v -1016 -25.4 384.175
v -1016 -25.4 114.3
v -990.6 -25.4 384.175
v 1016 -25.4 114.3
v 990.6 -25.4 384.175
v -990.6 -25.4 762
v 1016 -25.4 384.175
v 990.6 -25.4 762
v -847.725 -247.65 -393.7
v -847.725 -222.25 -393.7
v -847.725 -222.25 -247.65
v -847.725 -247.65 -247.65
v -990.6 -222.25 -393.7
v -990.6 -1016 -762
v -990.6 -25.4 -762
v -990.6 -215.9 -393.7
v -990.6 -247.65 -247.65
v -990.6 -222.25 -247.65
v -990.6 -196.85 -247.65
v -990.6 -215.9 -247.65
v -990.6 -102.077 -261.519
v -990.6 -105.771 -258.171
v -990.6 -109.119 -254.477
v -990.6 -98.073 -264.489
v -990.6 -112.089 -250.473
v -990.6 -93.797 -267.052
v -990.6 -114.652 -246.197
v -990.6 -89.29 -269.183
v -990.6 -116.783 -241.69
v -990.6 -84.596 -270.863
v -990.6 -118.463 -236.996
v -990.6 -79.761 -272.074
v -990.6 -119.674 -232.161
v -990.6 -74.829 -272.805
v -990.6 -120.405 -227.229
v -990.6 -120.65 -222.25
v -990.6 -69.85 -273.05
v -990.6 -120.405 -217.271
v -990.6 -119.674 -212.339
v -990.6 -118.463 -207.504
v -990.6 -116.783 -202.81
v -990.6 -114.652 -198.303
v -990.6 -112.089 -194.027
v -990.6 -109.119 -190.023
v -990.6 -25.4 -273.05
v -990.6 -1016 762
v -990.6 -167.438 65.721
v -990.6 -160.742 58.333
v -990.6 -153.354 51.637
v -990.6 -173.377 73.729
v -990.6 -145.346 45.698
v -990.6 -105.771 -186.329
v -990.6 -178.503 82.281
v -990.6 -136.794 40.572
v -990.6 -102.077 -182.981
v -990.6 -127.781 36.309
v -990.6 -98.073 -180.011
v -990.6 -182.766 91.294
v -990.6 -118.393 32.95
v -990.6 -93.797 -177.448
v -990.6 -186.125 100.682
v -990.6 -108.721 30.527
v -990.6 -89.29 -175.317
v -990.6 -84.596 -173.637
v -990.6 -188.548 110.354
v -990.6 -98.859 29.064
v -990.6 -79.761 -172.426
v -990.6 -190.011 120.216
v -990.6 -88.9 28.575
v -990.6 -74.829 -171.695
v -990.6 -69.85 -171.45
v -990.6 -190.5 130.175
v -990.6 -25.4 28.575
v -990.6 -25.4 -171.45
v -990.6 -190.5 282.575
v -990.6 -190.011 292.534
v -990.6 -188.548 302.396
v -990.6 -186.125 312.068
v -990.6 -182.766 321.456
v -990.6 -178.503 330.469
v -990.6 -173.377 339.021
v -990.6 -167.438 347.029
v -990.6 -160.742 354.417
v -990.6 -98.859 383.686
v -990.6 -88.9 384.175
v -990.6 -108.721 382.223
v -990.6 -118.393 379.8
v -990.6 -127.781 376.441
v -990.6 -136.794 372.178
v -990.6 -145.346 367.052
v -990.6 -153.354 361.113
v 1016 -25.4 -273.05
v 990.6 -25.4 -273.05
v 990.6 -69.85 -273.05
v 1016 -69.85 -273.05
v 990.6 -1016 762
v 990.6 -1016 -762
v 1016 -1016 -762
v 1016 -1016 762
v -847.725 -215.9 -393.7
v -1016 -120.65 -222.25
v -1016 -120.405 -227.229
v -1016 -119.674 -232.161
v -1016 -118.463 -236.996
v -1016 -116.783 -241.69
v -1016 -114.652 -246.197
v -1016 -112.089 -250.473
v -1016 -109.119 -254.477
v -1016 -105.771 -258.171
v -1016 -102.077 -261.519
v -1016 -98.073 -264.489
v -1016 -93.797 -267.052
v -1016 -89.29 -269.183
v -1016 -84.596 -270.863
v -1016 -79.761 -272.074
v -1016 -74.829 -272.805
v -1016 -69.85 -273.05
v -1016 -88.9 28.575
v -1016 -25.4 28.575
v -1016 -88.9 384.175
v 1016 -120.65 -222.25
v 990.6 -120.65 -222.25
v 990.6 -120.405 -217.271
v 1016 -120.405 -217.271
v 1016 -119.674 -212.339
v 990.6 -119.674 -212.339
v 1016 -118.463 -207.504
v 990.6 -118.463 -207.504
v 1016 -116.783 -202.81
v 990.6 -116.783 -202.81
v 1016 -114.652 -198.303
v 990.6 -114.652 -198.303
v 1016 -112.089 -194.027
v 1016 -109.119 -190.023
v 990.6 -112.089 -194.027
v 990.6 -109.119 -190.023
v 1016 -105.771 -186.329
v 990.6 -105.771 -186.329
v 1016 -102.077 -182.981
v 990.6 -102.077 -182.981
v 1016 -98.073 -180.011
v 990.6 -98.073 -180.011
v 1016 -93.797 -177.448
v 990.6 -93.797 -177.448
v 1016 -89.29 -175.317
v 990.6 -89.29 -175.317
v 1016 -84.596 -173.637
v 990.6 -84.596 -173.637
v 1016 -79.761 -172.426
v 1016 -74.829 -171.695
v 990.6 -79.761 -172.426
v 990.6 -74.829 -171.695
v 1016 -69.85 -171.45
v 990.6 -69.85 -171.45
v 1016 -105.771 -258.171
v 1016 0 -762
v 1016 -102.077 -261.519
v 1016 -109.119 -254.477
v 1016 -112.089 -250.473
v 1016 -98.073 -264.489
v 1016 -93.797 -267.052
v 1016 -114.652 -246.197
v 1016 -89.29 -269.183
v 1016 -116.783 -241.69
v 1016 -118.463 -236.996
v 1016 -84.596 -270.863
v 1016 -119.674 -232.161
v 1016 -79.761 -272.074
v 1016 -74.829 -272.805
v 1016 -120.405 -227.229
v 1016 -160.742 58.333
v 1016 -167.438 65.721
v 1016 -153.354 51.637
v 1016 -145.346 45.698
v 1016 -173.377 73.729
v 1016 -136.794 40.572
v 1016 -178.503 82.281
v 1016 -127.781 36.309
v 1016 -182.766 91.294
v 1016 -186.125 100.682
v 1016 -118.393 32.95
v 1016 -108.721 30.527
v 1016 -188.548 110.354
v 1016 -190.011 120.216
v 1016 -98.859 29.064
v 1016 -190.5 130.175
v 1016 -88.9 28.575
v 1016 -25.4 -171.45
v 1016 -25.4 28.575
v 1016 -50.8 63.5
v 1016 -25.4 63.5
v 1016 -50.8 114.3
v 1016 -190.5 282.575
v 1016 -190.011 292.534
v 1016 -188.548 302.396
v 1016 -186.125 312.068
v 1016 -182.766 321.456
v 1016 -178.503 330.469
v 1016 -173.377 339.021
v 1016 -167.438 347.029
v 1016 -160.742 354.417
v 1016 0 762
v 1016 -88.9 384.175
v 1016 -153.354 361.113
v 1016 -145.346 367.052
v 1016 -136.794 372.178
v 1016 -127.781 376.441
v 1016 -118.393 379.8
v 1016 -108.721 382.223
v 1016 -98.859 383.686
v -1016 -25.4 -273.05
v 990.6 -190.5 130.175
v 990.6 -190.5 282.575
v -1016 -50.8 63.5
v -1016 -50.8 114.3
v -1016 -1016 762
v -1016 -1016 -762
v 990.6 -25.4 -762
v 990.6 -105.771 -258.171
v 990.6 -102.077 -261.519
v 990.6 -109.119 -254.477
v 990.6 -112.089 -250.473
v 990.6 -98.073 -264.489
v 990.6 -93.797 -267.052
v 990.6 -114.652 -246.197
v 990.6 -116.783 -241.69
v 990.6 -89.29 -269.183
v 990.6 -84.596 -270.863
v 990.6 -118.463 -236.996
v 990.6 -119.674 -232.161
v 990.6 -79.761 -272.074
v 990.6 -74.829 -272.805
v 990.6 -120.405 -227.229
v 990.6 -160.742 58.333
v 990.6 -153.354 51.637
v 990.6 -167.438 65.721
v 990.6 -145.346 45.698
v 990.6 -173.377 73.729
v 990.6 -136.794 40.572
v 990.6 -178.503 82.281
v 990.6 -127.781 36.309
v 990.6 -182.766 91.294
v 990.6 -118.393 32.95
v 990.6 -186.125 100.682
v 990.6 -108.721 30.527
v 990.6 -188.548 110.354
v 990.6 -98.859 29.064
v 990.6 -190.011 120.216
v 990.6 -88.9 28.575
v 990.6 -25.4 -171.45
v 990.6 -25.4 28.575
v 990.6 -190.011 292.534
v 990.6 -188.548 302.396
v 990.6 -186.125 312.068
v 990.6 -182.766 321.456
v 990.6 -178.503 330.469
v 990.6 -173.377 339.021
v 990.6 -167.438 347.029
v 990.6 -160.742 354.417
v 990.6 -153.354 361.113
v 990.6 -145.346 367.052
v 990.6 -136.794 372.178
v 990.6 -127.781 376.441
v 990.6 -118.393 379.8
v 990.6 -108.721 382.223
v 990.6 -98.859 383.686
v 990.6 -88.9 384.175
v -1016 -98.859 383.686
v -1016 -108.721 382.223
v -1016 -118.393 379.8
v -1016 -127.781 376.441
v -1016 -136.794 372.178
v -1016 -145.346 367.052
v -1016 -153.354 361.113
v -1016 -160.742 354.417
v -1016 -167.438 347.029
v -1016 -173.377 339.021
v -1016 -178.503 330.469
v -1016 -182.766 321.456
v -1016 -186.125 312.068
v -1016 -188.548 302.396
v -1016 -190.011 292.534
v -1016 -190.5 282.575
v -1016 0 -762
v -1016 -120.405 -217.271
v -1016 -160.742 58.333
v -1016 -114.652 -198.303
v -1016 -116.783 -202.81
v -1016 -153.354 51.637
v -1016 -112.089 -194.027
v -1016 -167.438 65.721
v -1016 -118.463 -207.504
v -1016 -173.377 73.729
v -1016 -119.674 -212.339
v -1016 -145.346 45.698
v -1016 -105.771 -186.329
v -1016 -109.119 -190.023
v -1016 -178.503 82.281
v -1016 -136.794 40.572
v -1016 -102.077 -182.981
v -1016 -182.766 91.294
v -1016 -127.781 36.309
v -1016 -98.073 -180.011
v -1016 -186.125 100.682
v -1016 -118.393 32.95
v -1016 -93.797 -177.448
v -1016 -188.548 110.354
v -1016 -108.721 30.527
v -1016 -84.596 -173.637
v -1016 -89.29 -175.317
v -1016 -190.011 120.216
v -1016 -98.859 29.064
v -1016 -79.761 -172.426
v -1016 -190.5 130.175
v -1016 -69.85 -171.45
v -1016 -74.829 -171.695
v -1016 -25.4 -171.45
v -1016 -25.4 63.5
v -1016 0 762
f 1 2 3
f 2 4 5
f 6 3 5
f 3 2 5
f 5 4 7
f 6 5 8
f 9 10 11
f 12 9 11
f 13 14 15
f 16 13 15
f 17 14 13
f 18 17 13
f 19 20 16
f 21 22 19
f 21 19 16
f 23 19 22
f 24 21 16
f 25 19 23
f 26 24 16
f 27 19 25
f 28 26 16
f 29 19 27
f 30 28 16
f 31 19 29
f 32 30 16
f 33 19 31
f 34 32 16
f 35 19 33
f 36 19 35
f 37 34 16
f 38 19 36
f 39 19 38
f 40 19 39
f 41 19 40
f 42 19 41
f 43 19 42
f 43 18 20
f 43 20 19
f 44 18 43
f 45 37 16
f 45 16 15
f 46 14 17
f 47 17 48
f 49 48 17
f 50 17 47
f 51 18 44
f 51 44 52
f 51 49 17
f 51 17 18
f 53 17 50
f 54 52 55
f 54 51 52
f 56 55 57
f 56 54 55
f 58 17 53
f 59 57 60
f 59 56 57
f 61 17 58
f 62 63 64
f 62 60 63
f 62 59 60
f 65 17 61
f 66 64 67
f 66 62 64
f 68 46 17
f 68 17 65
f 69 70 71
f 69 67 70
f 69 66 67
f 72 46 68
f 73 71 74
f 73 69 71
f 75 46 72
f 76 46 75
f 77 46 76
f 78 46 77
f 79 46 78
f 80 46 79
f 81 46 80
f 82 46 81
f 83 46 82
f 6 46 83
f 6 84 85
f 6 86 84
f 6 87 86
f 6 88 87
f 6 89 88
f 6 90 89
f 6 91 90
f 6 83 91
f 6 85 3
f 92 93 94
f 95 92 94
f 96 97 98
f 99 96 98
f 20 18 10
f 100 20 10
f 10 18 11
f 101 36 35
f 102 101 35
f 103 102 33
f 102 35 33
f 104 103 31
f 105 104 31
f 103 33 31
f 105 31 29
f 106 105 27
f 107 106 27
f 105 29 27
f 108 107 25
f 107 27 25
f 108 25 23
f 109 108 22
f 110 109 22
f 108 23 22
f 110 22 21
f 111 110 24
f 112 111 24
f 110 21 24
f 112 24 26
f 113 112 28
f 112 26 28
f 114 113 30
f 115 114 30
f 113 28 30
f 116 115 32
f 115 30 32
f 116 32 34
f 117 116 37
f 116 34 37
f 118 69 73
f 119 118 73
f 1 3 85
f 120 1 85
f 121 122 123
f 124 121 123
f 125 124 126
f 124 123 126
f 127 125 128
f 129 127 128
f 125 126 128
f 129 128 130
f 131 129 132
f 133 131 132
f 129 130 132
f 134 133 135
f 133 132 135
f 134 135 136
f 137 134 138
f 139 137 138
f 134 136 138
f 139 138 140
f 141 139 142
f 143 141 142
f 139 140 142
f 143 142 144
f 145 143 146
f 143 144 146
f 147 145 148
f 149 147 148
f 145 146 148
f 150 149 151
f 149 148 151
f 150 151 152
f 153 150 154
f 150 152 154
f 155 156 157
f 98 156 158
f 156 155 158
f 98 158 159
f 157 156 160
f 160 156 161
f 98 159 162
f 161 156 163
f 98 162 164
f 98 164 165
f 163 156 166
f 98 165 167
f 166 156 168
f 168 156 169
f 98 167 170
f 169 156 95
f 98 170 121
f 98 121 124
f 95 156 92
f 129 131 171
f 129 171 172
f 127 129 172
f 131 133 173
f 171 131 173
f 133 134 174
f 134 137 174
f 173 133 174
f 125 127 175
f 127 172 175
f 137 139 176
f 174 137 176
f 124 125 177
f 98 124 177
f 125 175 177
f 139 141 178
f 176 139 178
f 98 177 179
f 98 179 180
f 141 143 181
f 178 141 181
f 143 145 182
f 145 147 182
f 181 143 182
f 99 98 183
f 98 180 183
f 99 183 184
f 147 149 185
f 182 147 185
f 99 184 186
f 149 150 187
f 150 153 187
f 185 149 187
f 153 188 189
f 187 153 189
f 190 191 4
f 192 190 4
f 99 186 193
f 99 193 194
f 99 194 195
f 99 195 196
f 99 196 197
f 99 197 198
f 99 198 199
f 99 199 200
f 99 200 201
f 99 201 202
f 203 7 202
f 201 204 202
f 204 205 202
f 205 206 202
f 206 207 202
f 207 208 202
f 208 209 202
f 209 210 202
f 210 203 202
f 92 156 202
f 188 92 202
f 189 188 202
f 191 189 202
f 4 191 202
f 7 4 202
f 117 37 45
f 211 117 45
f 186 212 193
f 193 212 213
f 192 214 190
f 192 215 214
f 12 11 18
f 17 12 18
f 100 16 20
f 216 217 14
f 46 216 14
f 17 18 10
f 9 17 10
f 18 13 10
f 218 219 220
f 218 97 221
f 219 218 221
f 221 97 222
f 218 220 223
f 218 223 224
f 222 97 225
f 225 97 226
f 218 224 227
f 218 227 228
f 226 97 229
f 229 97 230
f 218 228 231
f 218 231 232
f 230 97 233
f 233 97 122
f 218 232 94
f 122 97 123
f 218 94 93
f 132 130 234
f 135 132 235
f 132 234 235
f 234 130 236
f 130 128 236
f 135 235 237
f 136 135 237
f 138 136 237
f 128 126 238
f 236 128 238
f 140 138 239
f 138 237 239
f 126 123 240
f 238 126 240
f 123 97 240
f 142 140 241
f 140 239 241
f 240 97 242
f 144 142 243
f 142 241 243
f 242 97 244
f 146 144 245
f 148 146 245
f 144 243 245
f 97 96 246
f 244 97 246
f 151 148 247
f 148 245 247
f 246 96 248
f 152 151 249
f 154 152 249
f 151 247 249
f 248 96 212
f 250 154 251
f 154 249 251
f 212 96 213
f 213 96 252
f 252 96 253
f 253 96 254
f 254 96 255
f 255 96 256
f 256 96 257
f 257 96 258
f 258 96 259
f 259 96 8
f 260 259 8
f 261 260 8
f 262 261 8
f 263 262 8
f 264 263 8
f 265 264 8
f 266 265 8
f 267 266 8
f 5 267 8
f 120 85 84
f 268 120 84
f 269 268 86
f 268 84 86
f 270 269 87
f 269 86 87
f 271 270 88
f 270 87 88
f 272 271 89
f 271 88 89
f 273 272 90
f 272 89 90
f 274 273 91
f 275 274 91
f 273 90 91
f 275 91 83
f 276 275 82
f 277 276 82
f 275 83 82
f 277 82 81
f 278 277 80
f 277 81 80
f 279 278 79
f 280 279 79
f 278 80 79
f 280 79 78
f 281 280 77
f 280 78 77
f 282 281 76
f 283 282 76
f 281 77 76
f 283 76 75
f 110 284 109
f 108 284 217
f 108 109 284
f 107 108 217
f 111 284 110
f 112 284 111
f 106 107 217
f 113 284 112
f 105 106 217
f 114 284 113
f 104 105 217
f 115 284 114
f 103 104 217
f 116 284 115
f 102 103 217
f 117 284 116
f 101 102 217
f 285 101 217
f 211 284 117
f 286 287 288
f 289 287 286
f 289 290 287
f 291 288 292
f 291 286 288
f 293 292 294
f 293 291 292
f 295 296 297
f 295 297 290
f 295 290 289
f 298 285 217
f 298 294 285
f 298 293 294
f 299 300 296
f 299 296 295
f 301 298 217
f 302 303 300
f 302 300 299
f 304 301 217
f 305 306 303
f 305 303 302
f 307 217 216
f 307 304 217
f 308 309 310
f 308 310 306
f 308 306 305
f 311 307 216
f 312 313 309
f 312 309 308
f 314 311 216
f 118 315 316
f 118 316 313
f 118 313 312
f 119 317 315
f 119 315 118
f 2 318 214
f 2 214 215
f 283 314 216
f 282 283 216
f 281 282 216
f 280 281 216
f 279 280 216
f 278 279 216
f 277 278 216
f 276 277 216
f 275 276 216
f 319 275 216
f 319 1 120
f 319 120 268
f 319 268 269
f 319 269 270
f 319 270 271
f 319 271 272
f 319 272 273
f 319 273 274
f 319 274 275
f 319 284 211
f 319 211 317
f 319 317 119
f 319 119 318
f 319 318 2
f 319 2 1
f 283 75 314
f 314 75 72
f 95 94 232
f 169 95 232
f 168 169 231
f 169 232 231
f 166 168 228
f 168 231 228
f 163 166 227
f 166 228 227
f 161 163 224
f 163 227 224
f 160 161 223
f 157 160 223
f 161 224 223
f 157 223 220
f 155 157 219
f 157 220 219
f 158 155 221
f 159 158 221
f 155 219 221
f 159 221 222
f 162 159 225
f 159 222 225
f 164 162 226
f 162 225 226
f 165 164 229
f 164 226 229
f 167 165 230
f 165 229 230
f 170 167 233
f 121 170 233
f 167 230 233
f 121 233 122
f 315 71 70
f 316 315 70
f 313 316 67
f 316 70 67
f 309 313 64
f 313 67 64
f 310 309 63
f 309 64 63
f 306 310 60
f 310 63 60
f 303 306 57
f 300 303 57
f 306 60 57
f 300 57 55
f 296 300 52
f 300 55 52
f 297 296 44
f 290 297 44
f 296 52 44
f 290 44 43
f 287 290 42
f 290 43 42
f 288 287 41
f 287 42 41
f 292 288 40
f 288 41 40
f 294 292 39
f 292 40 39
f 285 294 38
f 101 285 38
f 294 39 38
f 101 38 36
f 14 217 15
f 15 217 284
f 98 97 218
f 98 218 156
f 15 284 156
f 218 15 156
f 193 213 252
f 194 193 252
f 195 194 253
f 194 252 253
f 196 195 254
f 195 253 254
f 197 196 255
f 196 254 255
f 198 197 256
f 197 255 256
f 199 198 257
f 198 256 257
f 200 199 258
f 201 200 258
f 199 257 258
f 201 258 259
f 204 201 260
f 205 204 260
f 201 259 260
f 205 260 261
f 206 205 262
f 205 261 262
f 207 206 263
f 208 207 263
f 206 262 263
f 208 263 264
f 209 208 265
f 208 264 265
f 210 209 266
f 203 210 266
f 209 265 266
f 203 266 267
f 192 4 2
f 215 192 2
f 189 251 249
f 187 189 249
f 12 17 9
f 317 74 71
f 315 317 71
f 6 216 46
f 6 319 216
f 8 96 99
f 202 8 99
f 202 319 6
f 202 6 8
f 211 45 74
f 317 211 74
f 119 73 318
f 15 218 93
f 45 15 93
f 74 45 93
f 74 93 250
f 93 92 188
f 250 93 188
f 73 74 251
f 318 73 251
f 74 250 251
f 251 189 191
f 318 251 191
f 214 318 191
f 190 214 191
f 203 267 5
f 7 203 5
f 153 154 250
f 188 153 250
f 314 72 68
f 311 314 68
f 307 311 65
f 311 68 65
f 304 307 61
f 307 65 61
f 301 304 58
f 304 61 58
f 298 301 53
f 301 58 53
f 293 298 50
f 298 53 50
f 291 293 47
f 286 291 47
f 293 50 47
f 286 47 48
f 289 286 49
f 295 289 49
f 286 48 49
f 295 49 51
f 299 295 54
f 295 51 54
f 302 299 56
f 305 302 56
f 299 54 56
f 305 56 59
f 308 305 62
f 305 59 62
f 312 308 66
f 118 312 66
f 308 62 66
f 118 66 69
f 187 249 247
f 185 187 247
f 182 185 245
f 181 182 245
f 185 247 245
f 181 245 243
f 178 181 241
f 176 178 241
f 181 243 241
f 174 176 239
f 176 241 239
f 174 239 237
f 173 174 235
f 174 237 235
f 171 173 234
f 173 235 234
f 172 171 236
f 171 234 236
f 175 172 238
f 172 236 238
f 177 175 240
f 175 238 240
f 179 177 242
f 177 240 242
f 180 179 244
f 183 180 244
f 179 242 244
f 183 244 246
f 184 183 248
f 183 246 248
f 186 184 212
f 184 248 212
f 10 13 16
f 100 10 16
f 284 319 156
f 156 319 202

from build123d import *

# Parameters (mm, degrees)
F0_W      = 2032
F0_H      = 1524
F1_DEPTH  = 1016
F2_T      = -25.4
F4_DEPTH  = 50.8
F6_DEPTH  = 50.8
F8_DEPTH  = 50.8
F10_DEPTH = 50.8
F12_DEPTH = 25.4
F13_W     = 1981.2
F13_H     = 990.6
F14_DEPTH = 50.8
F15_W     = 6.35
F15_H     = 146.05
F16_DEPTH = 142.875
F18_DEPTH = 25.4
F19_DEPTH = 25.4


with BuildPart() as f1:
    # F0 (on Front) → F1 (new body)
    with BuildSketch(Plane.XZ):
        Rectangle(F0_W, F0_H)
    extrude(amount=F1_DEPTH)

    # F2
    f2_openings = [f1.faces().sort_by_distance(p)[0] for p in [
        (0, -1016, 0),
        (0, -508, 762),
    ]]
    offset(amount=F2_T, openings=f2_openings)

    # F3 (on face) → F4 (cut)
    with BuildSketch(Plane.YZ.offset(-990.6)):
        with BuildLine():
            Line((-88.9, 28.575), (-25.4, 28.575))
            Line((-25.4, 28.575), (-25.4, 384.175))
            Line((-25.4, 384.175), (-88.9, 384.175))
            ThreePointArc((-88.9, 384.175), (-160.742049, 354.417049), (-190.5, 282.575))
            Line((-190.5, 282.575), (-190.5, 130.175))
            ThreePointArc((-190.5, 130.175), (-160.742049, 58.332951), (-88.9, 28.575))
        make_face()
    extrude(amount=-F4_DEPTH, mode=Mode.SUBTRACT)

    # F5 (on face) → F6 (cut)
    with BuildSketch(Plane.YZ.offset(-990.6)):
        with BuildLine():
            Line((-69.85, -273.05), (-25.4, -273.05))
            Line((-25.4, -273.05), (-25.4, -171.45))
            Line((-25.4, -171.45), (-69.85, -171.45))
            ThreePointArc((-69.85, -171.45), (-105.771024, -186.328976), (-120.65, -222.25))
            ThreePointArc((-120.65, -222.25), (-105.771024, -258.171024), (-69.85, -273.05))
        make_face()
    extrude(amount=-F6_DEPTH, mode=Mode.SUBTRACT)

    # F7 (on face) → F8 (cut)
    with BuildSketch(Plane(origin=(990.6, 0, 0), x_dir=(0, -1, 0), z_dir=(-1, 0, 0))):
        with BuildLine():
            Line((25.4, 384.175), (25.4, 28.575))
            Line((25.4, 28.575), (88.9, 28.575))
            ThreePointArc((88.9, 28.575), (160.742049, 58.332951), (190.5, 130.175))
            Line((190.5, 130.175), (190.5, 282.575))
            ThreePointArc((190.5, 282.575), (160.742049, 354.417049), (88.9, 384.175))
            Line((88.9, 384.175), (25.4, 384.175))
        make_face()
    extrude(amount=-F8_DEPTH, mode=Mode.SUBTRACT)

    # F9 (on face) → F10 (cut)
    with BuildSketch(Plane(origin=(990.6, 0, 0), x_dir=(0, -1, 0), z_dir=(-1, 0, 0))):
        with BuildLine():
            Line((25.4, -171.45), (25.4, -273.05))
            Line((25.4, -273.05), (69.85, -273.05))
            ThreePointArc((69.85, -273.05), (105.771024, -258.171024), (120.65, -222.25))
            ThreePointArc((120.65, -222.25), (105.771024, -186.328976), (69.85, -171.45))
            Line((69.85, -171.45), (25.4, -171.45))
        make_face()
    extrude(amount=-F10_DEPTH, mode=Mode.SUBTRACT)

    # F11 (on face) → F12 (join)
    with BuildSketch(Plane.XZ.offset(25.4)):
        Polygon((-1016, 63.5), (-990.6, 63.5), (1016, 63.5), (1016, 114.3), (-1016, 114.3), align=None)
    extrude(amount=F12_DEPTH)

    # F13 (on face) → F14 (cut)
    with BuildSketch(Plane.XY.offset(-736.6)):
        with Locations((0, -520.7)):
            Rectangle(F13_W, F13_H)
    extrude(amount=-F14_DEPTH, mode=Mode.SUBTRACT)

    # F15 (on face) → F16 (join)
    with BuildSketch(Plane.YZ.offset(-990.6)):
        with Locations((-219.075, -320.675)):
            Rectangle(F15_W, F15_H)
    extrude(amount=F16_DEPTH)

    # F17 (on face) → F18 (cut)
    with BuildSketch(Plane.XZ.offset(222.25)):
        Polygon((-990.6, -247.65), (-847.725, -393.7), (-847.725, -247.65), align=None)
    extrude(amount=-F18_DEPTH, mode=Mode.SUBTRACT)

    # F17 (on face) → F19 (join)
    with BuildSketch(Plane.XZ.offset(222.25)):
        Polygon((-990.6, -247.65), (-847.725, -393.7), (-847.725, -247.65), align=None)
    extrude(amount=F19_DEPTH)


solid = f1.part
